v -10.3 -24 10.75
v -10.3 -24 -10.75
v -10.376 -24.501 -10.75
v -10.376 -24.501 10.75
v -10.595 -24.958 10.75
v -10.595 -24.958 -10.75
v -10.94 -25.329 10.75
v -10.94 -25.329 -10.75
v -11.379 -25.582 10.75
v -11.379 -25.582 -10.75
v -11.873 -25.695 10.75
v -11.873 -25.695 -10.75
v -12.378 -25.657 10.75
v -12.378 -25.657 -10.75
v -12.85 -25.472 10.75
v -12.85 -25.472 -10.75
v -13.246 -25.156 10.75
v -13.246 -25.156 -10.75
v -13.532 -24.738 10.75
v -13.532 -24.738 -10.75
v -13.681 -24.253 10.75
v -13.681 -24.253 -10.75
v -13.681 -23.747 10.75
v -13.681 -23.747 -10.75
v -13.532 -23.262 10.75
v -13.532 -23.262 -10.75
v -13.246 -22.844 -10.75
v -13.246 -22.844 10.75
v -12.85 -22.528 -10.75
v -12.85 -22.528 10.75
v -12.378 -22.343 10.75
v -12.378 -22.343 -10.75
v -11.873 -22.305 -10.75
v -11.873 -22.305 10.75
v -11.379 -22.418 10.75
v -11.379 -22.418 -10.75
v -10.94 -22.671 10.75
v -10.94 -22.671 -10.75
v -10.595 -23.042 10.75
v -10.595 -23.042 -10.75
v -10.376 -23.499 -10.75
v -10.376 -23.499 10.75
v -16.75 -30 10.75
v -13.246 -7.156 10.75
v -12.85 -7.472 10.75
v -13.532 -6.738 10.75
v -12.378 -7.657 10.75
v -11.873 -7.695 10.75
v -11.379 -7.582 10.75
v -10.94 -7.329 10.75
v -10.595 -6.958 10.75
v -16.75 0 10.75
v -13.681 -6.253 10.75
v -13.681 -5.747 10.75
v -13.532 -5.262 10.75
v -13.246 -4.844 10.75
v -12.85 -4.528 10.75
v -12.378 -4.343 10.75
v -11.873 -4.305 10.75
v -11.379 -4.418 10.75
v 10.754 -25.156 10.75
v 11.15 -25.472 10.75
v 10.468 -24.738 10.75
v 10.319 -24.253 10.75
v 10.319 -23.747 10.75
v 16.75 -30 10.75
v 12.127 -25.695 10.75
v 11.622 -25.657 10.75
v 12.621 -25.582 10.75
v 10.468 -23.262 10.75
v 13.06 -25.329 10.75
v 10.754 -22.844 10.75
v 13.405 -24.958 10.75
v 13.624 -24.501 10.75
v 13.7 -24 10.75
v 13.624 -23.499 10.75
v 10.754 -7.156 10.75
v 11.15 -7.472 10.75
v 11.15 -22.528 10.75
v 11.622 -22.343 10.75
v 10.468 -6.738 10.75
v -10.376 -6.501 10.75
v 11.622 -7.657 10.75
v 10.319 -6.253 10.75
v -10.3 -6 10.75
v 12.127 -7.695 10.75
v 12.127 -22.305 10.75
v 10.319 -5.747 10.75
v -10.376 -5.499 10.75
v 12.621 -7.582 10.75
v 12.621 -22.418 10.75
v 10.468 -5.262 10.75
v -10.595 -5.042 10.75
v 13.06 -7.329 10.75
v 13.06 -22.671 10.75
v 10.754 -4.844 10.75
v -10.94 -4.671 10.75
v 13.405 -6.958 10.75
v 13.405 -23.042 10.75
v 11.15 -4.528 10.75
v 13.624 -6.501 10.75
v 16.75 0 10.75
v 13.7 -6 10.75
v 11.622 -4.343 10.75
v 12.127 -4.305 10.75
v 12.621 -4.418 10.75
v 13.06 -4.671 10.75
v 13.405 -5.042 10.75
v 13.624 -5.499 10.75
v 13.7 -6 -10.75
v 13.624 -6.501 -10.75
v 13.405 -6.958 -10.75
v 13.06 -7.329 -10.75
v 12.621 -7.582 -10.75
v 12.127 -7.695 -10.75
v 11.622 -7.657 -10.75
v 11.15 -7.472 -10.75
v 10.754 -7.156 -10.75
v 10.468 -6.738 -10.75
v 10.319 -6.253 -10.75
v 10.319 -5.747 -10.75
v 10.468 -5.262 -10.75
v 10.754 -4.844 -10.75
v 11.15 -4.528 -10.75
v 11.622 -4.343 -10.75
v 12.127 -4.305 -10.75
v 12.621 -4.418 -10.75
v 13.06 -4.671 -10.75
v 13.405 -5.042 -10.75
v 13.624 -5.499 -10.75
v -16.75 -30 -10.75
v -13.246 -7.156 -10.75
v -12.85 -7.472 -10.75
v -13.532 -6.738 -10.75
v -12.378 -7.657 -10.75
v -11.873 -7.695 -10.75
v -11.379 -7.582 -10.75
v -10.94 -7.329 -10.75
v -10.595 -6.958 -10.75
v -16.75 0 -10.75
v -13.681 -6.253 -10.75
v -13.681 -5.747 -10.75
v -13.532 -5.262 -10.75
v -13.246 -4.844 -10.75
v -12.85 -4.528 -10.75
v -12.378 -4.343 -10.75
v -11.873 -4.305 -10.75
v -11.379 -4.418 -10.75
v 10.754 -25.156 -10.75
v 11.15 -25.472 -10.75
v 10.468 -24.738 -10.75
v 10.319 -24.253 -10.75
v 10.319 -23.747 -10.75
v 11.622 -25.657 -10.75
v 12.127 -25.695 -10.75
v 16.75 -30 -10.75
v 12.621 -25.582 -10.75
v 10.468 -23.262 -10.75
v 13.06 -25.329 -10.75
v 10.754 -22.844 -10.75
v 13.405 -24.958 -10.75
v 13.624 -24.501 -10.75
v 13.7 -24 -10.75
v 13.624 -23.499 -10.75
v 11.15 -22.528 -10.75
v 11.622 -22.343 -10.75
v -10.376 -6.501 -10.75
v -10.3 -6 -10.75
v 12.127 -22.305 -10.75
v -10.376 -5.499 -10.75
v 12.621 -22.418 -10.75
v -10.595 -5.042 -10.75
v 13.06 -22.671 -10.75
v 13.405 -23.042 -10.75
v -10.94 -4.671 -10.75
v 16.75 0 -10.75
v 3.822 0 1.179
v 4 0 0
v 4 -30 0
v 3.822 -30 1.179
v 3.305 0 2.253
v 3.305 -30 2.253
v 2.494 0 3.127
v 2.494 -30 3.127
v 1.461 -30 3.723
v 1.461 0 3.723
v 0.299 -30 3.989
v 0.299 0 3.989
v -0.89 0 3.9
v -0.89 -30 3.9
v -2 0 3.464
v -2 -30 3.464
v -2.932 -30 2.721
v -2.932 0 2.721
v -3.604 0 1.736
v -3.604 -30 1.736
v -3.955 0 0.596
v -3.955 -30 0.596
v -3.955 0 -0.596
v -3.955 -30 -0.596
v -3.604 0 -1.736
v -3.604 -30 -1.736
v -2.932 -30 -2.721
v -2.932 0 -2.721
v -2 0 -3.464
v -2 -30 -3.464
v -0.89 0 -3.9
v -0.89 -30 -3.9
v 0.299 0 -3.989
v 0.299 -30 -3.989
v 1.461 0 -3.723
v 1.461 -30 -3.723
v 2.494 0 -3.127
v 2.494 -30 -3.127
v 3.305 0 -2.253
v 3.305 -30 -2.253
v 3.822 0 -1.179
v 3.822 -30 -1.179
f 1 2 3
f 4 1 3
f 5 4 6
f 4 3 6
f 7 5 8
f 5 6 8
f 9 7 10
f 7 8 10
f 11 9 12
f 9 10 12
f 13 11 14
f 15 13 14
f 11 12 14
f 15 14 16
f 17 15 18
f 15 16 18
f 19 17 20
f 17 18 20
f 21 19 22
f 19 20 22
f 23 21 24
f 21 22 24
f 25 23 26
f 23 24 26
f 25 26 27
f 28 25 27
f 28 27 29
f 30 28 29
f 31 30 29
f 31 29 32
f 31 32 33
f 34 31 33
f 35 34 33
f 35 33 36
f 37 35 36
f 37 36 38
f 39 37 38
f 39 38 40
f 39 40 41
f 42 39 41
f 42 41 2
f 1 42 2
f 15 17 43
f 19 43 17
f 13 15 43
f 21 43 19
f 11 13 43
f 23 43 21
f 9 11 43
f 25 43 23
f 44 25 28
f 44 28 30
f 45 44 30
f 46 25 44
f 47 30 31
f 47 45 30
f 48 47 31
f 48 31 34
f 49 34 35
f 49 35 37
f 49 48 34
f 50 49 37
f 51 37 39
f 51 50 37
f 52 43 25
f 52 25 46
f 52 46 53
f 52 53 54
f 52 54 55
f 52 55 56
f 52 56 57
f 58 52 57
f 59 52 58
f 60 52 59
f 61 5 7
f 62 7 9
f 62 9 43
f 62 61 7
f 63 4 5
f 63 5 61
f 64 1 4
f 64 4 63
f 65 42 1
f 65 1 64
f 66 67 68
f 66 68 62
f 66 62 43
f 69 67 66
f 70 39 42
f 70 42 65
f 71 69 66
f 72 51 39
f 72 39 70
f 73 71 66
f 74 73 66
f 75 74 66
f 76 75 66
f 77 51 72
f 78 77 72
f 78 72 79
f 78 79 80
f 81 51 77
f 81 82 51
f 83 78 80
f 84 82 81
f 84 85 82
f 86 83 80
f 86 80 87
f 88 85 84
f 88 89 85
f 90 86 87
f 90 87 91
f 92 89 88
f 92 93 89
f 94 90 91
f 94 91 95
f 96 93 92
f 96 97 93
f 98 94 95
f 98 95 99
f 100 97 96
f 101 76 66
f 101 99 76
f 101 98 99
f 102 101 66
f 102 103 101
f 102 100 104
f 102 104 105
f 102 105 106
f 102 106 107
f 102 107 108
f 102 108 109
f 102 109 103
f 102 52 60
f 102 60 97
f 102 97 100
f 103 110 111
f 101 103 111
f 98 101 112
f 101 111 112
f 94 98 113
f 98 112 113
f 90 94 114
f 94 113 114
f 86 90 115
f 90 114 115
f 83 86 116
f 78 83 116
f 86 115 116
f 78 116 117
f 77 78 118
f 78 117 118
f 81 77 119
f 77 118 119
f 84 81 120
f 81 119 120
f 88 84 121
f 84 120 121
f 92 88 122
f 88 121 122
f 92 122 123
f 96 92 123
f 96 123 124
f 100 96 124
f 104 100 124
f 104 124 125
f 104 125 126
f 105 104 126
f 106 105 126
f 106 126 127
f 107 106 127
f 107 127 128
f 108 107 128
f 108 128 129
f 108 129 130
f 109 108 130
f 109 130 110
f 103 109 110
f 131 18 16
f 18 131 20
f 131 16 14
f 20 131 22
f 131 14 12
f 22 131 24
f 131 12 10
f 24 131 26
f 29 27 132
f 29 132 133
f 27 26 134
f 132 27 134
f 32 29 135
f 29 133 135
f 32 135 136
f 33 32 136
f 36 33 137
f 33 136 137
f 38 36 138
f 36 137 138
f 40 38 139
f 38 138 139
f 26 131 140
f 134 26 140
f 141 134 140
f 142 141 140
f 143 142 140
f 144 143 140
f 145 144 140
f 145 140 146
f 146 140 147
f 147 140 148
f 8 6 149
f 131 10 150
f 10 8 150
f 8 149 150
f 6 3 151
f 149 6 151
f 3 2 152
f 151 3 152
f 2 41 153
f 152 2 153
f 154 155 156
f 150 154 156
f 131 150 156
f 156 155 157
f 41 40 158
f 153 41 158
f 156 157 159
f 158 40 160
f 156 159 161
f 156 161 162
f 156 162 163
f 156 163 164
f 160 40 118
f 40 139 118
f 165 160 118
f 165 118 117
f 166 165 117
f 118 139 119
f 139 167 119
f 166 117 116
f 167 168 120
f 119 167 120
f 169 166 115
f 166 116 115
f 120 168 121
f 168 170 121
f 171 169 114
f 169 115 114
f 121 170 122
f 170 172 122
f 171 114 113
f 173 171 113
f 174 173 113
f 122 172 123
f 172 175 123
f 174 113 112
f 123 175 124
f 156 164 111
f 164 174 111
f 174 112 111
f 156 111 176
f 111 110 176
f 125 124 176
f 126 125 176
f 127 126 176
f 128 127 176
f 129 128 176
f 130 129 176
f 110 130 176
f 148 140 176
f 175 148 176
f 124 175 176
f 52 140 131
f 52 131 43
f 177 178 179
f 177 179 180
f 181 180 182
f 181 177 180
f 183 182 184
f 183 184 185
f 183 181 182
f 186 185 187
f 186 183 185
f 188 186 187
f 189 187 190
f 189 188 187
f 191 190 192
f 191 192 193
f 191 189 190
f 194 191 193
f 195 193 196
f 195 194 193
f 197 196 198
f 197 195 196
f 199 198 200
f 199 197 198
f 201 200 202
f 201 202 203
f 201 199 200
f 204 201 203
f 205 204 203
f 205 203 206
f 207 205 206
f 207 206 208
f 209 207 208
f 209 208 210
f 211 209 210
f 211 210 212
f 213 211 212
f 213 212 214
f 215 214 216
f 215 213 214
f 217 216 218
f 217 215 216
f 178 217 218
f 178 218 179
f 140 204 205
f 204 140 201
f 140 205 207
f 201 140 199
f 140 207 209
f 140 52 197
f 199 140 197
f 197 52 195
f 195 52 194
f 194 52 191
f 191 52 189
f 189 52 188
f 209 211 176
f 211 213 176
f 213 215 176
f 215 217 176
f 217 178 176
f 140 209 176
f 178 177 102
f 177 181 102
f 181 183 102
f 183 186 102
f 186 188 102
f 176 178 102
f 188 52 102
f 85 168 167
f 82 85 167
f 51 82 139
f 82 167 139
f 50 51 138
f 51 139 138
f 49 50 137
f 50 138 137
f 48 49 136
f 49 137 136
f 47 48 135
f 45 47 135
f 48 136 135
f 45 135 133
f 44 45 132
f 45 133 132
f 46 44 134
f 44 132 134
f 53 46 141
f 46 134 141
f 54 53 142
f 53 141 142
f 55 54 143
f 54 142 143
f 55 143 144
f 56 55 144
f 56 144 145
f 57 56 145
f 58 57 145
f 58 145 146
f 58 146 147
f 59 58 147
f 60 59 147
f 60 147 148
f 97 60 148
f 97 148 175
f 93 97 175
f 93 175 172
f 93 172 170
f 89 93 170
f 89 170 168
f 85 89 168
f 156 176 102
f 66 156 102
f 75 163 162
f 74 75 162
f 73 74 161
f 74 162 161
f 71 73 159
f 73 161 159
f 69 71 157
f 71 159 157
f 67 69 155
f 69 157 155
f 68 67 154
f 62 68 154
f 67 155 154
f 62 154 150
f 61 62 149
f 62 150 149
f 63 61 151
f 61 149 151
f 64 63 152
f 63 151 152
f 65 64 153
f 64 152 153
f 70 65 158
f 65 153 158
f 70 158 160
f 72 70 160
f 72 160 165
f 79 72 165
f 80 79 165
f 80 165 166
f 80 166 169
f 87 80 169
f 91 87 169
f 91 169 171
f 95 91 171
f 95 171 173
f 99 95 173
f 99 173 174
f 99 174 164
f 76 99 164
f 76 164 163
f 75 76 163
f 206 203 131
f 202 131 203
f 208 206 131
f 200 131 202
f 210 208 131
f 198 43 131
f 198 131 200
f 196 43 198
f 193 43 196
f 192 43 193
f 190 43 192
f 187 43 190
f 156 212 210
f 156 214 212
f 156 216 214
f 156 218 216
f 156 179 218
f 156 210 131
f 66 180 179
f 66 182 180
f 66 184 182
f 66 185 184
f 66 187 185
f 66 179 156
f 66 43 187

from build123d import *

# Parameters (mm, degrees)
SKETCH_W     = 33.5
SKETCH_H     = 21.5
SKETCH_R     = 4
PAD_DEPTH    = 30
SKETCH001_R  = 1.7
POCKET_DEPTH = 21.501


with BuildPart() as part:
    # Sketch → Pad (new body)
    with BuildSketch(Plane.XZ):
        Rectangle(SKETCH_W, SKETCH_H)
        Circle(SKETCH_R, mode=Mode.SUBTRACT)
    extrude(amount=PAD_DEPTH)

    # Sketch001 → Pocket (cut, through all)
    with BuildSketch(Plane(origin=(0, 0, -10.75), x_dir=(1, 0, 0), z_dir=(0, 0, -1))):
        with Locations((-12, 24)):
            Circle(SKETCH001_R)
        with Locations((12, 24)):
            Circle(SKETCH001_R)
        with Locations((12, 6)):
            Circle(SKETCH001_R)
        with Locations((-12, 6)):
            Circle(SKETCH001_R)
    extrude(amount=-POCKET_DEPTH, mode=Mode.SUBTRACT)


solid = part.part
